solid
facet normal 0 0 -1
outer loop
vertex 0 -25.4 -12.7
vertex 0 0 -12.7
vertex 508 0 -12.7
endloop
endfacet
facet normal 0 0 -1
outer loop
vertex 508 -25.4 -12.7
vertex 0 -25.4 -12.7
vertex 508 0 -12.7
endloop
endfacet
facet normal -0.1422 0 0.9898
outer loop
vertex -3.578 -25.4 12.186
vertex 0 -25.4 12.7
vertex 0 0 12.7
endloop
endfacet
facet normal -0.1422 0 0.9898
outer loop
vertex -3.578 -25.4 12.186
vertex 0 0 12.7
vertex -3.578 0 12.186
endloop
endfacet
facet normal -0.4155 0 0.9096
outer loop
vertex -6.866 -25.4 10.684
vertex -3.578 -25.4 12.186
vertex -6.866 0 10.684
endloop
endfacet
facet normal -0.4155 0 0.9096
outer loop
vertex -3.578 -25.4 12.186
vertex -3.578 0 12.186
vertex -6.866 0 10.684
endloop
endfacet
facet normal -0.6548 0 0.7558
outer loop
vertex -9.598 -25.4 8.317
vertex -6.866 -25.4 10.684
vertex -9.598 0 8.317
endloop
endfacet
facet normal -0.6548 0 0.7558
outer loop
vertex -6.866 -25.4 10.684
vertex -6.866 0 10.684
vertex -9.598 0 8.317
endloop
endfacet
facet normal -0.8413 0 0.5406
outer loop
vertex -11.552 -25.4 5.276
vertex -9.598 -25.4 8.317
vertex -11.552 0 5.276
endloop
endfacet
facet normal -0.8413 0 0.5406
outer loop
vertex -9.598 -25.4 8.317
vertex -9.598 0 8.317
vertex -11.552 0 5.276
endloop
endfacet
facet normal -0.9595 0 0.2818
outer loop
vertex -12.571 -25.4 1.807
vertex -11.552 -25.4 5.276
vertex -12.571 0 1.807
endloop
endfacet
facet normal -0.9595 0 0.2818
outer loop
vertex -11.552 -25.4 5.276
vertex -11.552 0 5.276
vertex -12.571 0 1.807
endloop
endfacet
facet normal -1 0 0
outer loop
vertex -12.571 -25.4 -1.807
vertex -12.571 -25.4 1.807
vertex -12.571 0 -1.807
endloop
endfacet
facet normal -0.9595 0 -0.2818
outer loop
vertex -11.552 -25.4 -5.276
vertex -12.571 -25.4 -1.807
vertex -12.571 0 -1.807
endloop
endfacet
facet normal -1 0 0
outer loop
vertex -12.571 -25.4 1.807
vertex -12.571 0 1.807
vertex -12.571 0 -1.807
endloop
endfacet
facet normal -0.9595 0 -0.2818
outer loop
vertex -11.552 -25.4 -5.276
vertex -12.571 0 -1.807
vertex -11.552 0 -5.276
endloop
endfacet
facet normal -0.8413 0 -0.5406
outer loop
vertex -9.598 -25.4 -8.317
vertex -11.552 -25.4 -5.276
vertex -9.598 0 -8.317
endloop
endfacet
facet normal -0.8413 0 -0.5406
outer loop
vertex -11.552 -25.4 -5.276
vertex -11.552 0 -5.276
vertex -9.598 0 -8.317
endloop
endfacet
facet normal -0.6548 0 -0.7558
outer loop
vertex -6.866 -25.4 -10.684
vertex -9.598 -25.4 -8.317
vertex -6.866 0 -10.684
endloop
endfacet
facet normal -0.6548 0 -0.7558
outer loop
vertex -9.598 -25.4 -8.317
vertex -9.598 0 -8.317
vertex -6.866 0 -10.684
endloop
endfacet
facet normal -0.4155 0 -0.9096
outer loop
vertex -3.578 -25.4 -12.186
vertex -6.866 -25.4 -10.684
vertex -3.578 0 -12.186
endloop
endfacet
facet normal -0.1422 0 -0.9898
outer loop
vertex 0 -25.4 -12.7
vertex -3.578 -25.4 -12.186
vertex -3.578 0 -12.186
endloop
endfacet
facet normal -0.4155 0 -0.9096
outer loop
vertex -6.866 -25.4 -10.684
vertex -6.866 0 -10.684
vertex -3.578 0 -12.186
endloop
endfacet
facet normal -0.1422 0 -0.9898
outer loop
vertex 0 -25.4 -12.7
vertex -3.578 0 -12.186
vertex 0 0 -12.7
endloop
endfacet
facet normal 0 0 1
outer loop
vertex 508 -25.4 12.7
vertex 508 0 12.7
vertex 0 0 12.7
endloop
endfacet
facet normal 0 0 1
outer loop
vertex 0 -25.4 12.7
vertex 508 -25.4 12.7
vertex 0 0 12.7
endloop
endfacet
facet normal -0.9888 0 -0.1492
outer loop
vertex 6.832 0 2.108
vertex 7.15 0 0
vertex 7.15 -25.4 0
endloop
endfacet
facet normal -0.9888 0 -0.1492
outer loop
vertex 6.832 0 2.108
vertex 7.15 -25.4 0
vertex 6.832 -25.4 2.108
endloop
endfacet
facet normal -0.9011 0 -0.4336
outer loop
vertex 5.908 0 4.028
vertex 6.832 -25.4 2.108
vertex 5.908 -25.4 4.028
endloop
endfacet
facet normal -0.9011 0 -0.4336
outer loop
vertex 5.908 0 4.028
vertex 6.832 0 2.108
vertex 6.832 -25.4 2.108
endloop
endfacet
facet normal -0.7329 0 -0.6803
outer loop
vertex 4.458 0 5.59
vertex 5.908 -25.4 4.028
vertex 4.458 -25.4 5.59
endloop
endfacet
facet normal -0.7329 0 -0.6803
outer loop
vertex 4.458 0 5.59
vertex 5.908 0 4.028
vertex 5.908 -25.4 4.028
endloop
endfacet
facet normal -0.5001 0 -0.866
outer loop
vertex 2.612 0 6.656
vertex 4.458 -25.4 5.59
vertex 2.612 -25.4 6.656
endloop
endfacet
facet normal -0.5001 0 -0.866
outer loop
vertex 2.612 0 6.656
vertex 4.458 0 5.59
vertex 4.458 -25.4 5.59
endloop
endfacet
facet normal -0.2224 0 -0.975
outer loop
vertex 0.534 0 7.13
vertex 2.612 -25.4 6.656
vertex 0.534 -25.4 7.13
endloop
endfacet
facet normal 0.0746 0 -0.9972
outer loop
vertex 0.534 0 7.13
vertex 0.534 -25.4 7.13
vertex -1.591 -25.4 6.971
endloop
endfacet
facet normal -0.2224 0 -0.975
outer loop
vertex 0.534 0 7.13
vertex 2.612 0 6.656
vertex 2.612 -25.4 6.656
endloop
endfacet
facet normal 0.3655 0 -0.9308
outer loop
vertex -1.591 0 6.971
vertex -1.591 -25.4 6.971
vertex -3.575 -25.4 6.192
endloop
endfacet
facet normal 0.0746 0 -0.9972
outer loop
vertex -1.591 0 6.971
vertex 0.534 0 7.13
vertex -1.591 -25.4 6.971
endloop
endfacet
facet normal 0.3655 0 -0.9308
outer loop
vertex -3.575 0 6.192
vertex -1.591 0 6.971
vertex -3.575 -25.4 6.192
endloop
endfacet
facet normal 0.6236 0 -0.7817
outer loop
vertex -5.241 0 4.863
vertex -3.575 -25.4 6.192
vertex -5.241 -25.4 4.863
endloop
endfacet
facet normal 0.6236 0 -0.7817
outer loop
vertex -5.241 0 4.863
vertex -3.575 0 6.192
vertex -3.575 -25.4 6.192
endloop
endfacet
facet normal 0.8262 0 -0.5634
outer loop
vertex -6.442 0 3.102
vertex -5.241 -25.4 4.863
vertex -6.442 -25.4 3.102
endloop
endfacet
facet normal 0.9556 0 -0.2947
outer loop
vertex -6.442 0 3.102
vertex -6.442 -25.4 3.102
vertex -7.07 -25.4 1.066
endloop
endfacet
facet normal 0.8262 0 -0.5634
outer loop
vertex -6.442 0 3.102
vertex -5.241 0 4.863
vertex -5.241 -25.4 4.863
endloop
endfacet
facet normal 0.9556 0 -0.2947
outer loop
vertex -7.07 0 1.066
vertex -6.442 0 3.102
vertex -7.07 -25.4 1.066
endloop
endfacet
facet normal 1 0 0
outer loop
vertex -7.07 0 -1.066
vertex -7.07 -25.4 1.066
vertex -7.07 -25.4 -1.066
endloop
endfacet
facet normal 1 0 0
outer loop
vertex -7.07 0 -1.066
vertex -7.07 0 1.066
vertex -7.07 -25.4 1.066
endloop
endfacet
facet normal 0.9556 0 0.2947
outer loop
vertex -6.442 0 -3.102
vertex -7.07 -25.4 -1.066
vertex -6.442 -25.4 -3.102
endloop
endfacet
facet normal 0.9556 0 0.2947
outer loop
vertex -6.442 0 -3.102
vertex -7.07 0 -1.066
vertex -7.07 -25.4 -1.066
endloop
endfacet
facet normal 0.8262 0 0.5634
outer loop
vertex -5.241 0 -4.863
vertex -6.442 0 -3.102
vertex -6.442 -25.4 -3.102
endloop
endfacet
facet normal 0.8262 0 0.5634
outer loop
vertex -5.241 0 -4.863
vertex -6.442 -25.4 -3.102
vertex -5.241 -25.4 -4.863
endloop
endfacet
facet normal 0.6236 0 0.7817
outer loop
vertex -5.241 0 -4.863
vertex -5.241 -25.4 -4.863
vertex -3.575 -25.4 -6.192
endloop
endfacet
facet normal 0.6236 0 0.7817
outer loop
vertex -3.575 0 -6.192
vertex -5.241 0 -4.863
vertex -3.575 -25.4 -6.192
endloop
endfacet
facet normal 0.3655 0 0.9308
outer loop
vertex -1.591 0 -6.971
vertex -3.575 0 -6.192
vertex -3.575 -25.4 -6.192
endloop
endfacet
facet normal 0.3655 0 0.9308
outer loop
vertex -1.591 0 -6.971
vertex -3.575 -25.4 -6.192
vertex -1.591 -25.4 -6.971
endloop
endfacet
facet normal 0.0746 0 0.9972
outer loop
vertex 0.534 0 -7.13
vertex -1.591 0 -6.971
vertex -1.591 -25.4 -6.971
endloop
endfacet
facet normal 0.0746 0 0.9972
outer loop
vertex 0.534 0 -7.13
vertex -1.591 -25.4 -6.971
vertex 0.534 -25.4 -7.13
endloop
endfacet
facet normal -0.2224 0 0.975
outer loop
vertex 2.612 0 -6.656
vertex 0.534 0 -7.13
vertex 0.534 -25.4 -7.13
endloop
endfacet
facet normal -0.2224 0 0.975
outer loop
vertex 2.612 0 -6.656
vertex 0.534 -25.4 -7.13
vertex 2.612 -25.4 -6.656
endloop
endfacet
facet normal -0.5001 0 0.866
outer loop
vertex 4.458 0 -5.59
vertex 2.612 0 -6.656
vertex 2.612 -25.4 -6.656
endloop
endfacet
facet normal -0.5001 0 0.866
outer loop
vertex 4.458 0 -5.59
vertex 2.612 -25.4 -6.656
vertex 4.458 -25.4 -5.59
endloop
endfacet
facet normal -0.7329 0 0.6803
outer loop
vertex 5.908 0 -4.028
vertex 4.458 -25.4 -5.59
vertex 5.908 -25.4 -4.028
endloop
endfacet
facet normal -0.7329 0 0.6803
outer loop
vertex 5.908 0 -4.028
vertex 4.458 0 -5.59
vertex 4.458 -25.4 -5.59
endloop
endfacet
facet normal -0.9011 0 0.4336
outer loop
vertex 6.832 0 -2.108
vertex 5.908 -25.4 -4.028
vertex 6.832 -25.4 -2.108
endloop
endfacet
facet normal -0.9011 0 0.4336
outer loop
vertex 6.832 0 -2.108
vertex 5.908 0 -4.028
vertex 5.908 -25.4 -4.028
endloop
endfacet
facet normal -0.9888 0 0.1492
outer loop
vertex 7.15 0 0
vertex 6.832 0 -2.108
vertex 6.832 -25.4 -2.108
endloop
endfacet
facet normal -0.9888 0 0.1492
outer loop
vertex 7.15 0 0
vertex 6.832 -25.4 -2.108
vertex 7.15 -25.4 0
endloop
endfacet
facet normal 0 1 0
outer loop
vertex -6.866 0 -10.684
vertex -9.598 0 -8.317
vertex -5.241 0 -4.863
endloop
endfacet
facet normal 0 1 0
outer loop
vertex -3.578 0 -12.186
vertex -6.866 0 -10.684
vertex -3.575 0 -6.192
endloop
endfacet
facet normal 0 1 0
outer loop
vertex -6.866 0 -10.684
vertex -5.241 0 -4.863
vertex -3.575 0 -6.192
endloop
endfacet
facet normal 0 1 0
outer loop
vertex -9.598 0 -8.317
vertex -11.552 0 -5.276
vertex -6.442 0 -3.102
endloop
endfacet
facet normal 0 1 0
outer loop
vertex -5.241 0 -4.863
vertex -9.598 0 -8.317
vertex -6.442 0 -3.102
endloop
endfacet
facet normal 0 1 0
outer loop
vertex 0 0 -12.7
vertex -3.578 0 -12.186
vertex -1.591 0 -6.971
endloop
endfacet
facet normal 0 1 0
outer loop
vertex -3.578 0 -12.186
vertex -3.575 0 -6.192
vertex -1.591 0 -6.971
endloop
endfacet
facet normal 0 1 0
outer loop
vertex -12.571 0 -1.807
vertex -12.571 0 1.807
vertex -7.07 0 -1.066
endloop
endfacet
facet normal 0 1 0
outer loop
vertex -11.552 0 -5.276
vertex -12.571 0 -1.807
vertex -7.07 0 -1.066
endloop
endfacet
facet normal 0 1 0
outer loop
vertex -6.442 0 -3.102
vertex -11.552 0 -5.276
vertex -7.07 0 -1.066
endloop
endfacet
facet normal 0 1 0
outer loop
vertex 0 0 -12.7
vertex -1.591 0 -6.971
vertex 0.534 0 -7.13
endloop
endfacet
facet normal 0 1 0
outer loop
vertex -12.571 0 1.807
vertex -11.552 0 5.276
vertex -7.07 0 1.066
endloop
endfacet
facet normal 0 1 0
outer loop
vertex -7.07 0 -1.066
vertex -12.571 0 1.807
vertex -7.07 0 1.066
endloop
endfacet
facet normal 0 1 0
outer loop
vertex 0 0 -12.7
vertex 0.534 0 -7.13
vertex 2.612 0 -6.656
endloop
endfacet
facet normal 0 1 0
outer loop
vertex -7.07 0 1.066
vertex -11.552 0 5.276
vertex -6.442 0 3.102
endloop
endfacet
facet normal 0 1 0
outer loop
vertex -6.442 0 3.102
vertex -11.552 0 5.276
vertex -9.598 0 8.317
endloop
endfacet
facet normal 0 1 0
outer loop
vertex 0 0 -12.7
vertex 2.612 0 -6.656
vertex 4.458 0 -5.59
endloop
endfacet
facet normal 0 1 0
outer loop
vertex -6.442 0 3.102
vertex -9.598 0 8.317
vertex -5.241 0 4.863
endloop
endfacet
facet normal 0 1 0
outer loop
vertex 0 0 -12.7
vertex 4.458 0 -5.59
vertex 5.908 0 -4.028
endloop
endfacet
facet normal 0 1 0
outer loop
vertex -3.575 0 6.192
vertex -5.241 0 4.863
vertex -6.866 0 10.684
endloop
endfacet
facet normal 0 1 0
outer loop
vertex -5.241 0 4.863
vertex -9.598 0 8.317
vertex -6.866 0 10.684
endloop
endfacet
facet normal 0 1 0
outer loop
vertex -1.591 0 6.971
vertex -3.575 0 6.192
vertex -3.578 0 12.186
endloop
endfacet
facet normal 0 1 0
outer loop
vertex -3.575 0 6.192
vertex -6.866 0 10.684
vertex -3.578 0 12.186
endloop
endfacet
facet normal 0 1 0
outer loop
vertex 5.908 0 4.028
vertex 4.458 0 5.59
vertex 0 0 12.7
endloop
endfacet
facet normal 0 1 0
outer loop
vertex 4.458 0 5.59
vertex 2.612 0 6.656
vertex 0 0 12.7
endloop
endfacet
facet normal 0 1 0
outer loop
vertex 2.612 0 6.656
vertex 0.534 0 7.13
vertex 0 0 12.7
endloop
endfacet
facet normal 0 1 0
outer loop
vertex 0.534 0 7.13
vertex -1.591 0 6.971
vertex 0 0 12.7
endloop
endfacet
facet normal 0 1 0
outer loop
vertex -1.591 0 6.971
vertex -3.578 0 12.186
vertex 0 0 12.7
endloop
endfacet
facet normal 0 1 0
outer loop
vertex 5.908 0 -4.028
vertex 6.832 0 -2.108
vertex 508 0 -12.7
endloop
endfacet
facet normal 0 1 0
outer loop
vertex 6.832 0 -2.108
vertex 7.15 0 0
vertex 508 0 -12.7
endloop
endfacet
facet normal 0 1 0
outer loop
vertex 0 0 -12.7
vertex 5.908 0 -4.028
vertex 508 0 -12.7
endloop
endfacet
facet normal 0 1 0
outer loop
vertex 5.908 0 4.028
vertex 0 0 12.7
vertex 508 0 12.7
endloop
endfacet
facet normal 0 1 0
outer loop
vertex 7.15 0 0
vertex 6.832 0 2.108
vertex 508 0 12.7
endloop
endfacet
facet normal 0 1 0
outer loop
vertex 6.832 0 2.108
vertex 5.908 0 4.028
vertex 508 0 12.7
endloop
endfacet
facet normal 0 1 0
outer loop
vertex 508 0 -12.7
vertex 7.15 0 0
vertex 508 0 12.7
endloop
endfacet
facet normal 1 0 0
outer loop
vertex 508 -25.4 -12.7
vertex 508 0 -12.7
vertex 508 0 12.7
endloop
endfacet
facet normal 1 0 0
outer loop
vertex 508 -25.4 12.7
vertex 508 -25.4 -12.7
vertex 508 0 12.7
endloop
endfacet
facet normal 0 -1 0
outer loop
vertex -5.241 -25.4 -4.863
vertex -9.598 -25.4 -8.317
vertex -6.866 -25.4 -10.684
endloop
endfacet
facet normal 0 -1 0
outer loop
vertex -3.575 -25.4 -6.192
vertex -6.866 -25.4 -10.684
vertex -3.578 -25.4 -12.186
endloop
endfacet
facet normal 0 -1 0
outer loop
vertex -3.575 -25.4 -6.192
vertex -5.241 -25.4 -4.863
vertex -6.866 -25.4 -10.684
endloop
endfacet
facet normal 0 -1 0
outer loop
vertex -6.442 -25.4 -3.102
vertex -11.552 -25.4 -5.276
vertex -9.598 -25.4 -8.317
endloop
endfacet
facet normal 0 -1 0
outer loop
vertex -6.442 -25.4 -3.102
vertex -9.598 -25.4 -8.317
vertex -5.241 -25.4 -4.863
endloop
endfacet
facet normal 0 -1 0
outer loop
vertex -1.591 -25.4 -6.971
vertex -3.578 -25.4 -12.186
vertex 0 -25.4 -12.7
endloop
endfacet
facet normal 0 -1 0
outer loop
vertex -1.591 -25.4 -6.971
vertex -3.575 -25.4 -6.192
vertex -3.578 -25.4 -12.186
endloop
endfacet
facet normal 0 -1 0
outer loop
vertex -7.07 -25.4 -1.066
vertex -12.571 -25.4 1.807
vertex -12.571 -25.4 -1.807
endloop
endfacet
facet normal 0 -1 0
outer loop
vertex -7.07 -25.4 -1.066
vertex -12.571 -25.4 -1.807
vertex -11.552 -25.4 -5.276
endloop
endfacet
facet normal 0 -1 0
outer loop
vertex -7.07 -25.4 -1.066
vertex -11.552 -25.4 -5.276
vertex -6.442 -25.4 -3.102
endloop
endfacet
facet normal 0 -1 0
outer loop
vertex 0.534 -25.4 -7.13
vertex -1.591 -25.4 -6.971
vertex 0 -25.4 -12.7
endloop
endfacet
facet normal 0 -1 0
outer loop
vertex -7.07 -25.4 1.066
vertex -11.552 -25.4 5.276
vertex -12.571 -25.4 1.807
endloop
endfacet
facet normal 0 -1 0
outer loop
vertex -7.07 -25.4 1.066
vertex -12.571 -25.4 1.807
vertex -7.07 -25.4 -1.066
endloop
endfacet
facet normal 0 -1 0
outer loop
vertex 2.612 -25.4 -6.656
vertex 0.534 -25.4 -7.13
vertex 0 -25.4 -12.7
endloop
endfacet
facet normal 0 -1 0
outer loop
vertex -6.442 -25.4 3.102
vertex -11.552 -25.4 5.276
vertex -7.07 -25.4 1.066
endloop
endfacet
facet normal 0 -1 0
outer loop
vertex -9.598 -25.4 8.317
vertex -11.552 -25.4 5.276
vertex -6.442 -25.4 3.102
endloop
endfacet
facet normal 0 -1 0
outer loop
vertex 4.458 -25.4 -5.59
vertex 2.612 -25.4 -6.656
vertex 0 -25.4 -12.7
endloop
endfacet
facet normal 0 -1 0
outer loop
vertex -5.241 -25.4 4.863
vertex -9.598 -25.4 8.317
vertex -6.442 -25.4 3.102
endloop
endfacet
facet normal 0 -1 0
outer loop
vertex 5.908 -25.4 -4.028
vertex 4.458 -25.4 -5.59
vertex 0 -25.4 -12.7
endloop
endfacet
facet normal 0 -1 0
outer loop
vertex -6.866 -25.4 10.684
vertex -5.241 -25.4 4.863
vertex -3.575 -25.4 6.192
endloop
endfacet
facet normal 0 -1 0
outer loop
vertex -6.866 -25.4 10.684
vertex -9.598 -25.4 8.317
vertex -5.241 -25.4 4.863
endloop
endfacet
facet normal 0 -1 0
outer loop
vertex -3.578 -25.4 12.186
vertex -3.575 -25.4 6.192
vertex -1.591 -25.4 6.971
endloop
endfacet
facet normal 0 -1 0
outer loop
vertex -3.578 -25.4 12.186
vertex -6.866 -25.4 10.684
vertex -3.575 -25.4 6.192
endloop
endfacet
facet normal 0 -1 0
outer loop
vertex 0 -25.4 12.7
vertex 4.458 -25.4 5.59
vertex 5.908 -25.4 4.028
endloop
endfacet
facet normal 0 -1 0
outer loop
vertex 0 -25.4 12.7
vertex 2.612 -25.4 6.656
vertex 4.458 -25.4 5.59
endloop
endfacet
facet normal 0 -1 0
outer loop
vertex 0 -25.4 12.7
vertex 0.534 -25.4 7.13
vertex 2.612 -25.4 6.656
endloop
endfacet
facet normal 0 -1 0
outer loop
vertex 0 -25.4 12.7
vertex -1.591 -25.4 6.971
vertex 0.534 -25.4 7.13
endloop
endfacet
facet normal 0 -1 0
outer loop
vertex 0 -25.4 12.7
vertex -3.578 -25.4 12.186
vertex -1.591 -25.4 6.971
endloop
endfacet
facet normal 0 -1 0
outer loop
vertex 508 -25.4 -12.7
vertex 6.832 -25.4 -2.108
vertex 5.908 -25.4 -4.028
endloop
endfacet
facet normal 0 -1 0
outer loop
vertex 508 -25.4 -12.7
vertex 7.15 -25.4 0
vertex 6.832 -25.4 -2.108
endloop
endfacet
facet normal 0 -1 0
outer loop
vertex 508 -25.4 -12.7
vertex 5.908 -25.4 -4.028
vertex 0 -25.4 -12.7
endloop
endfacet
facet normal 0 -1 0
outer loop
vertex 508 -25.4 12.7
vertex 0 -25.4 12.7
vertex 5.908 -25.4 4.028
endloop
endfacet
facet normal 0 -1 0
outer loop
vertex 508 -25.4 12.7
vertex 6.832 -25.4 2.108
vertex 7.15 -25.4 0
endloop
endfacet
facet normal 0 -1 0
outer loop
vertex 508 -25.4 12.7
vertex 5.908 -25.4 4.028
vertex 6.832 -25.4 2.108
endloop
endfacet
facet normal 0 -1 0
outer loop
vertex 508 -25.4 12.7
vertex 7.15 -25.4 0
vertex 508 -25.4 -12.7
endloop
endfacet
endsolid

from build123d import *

# Parameters (mm, degrees)
F0_R     = 7.1501
F1_DEPTH = 25.4


with BuildPart() as f1:
    # F0 (on Front) → F1 (new body)
    with BuildSketch(Plane.XZ):
        with BuildLine():
            ThreePointArc((0, 12.7), (8.980256, 8.980256), (12.7, 0))
            ThreePointArc((12.7, 0), (8.980256, -8.980256), (0, -12.7))
            Line((0, -12.7), (508, -12.7))
            Line((508, -12.7), (508, 12.7))
            Line((508, 12.7), (0, 12.7))
        make_face()
        with BuildLine():
            ThreePointArc((0, -12.7), (8.980256, -8.980256), (12.7, 0))
            ThreePointArc((12.7, 0), (8.980256, 8.980256), (0, 12.7))
            ThreePointArc((0, 12.7), (-12.7, 0), (0, -12.7))
        make_face()
        Circle(F0_R, mode=Mode.SUBTRACT)
    extrude(amount=F1_DEPTH)


solid = f1.part
